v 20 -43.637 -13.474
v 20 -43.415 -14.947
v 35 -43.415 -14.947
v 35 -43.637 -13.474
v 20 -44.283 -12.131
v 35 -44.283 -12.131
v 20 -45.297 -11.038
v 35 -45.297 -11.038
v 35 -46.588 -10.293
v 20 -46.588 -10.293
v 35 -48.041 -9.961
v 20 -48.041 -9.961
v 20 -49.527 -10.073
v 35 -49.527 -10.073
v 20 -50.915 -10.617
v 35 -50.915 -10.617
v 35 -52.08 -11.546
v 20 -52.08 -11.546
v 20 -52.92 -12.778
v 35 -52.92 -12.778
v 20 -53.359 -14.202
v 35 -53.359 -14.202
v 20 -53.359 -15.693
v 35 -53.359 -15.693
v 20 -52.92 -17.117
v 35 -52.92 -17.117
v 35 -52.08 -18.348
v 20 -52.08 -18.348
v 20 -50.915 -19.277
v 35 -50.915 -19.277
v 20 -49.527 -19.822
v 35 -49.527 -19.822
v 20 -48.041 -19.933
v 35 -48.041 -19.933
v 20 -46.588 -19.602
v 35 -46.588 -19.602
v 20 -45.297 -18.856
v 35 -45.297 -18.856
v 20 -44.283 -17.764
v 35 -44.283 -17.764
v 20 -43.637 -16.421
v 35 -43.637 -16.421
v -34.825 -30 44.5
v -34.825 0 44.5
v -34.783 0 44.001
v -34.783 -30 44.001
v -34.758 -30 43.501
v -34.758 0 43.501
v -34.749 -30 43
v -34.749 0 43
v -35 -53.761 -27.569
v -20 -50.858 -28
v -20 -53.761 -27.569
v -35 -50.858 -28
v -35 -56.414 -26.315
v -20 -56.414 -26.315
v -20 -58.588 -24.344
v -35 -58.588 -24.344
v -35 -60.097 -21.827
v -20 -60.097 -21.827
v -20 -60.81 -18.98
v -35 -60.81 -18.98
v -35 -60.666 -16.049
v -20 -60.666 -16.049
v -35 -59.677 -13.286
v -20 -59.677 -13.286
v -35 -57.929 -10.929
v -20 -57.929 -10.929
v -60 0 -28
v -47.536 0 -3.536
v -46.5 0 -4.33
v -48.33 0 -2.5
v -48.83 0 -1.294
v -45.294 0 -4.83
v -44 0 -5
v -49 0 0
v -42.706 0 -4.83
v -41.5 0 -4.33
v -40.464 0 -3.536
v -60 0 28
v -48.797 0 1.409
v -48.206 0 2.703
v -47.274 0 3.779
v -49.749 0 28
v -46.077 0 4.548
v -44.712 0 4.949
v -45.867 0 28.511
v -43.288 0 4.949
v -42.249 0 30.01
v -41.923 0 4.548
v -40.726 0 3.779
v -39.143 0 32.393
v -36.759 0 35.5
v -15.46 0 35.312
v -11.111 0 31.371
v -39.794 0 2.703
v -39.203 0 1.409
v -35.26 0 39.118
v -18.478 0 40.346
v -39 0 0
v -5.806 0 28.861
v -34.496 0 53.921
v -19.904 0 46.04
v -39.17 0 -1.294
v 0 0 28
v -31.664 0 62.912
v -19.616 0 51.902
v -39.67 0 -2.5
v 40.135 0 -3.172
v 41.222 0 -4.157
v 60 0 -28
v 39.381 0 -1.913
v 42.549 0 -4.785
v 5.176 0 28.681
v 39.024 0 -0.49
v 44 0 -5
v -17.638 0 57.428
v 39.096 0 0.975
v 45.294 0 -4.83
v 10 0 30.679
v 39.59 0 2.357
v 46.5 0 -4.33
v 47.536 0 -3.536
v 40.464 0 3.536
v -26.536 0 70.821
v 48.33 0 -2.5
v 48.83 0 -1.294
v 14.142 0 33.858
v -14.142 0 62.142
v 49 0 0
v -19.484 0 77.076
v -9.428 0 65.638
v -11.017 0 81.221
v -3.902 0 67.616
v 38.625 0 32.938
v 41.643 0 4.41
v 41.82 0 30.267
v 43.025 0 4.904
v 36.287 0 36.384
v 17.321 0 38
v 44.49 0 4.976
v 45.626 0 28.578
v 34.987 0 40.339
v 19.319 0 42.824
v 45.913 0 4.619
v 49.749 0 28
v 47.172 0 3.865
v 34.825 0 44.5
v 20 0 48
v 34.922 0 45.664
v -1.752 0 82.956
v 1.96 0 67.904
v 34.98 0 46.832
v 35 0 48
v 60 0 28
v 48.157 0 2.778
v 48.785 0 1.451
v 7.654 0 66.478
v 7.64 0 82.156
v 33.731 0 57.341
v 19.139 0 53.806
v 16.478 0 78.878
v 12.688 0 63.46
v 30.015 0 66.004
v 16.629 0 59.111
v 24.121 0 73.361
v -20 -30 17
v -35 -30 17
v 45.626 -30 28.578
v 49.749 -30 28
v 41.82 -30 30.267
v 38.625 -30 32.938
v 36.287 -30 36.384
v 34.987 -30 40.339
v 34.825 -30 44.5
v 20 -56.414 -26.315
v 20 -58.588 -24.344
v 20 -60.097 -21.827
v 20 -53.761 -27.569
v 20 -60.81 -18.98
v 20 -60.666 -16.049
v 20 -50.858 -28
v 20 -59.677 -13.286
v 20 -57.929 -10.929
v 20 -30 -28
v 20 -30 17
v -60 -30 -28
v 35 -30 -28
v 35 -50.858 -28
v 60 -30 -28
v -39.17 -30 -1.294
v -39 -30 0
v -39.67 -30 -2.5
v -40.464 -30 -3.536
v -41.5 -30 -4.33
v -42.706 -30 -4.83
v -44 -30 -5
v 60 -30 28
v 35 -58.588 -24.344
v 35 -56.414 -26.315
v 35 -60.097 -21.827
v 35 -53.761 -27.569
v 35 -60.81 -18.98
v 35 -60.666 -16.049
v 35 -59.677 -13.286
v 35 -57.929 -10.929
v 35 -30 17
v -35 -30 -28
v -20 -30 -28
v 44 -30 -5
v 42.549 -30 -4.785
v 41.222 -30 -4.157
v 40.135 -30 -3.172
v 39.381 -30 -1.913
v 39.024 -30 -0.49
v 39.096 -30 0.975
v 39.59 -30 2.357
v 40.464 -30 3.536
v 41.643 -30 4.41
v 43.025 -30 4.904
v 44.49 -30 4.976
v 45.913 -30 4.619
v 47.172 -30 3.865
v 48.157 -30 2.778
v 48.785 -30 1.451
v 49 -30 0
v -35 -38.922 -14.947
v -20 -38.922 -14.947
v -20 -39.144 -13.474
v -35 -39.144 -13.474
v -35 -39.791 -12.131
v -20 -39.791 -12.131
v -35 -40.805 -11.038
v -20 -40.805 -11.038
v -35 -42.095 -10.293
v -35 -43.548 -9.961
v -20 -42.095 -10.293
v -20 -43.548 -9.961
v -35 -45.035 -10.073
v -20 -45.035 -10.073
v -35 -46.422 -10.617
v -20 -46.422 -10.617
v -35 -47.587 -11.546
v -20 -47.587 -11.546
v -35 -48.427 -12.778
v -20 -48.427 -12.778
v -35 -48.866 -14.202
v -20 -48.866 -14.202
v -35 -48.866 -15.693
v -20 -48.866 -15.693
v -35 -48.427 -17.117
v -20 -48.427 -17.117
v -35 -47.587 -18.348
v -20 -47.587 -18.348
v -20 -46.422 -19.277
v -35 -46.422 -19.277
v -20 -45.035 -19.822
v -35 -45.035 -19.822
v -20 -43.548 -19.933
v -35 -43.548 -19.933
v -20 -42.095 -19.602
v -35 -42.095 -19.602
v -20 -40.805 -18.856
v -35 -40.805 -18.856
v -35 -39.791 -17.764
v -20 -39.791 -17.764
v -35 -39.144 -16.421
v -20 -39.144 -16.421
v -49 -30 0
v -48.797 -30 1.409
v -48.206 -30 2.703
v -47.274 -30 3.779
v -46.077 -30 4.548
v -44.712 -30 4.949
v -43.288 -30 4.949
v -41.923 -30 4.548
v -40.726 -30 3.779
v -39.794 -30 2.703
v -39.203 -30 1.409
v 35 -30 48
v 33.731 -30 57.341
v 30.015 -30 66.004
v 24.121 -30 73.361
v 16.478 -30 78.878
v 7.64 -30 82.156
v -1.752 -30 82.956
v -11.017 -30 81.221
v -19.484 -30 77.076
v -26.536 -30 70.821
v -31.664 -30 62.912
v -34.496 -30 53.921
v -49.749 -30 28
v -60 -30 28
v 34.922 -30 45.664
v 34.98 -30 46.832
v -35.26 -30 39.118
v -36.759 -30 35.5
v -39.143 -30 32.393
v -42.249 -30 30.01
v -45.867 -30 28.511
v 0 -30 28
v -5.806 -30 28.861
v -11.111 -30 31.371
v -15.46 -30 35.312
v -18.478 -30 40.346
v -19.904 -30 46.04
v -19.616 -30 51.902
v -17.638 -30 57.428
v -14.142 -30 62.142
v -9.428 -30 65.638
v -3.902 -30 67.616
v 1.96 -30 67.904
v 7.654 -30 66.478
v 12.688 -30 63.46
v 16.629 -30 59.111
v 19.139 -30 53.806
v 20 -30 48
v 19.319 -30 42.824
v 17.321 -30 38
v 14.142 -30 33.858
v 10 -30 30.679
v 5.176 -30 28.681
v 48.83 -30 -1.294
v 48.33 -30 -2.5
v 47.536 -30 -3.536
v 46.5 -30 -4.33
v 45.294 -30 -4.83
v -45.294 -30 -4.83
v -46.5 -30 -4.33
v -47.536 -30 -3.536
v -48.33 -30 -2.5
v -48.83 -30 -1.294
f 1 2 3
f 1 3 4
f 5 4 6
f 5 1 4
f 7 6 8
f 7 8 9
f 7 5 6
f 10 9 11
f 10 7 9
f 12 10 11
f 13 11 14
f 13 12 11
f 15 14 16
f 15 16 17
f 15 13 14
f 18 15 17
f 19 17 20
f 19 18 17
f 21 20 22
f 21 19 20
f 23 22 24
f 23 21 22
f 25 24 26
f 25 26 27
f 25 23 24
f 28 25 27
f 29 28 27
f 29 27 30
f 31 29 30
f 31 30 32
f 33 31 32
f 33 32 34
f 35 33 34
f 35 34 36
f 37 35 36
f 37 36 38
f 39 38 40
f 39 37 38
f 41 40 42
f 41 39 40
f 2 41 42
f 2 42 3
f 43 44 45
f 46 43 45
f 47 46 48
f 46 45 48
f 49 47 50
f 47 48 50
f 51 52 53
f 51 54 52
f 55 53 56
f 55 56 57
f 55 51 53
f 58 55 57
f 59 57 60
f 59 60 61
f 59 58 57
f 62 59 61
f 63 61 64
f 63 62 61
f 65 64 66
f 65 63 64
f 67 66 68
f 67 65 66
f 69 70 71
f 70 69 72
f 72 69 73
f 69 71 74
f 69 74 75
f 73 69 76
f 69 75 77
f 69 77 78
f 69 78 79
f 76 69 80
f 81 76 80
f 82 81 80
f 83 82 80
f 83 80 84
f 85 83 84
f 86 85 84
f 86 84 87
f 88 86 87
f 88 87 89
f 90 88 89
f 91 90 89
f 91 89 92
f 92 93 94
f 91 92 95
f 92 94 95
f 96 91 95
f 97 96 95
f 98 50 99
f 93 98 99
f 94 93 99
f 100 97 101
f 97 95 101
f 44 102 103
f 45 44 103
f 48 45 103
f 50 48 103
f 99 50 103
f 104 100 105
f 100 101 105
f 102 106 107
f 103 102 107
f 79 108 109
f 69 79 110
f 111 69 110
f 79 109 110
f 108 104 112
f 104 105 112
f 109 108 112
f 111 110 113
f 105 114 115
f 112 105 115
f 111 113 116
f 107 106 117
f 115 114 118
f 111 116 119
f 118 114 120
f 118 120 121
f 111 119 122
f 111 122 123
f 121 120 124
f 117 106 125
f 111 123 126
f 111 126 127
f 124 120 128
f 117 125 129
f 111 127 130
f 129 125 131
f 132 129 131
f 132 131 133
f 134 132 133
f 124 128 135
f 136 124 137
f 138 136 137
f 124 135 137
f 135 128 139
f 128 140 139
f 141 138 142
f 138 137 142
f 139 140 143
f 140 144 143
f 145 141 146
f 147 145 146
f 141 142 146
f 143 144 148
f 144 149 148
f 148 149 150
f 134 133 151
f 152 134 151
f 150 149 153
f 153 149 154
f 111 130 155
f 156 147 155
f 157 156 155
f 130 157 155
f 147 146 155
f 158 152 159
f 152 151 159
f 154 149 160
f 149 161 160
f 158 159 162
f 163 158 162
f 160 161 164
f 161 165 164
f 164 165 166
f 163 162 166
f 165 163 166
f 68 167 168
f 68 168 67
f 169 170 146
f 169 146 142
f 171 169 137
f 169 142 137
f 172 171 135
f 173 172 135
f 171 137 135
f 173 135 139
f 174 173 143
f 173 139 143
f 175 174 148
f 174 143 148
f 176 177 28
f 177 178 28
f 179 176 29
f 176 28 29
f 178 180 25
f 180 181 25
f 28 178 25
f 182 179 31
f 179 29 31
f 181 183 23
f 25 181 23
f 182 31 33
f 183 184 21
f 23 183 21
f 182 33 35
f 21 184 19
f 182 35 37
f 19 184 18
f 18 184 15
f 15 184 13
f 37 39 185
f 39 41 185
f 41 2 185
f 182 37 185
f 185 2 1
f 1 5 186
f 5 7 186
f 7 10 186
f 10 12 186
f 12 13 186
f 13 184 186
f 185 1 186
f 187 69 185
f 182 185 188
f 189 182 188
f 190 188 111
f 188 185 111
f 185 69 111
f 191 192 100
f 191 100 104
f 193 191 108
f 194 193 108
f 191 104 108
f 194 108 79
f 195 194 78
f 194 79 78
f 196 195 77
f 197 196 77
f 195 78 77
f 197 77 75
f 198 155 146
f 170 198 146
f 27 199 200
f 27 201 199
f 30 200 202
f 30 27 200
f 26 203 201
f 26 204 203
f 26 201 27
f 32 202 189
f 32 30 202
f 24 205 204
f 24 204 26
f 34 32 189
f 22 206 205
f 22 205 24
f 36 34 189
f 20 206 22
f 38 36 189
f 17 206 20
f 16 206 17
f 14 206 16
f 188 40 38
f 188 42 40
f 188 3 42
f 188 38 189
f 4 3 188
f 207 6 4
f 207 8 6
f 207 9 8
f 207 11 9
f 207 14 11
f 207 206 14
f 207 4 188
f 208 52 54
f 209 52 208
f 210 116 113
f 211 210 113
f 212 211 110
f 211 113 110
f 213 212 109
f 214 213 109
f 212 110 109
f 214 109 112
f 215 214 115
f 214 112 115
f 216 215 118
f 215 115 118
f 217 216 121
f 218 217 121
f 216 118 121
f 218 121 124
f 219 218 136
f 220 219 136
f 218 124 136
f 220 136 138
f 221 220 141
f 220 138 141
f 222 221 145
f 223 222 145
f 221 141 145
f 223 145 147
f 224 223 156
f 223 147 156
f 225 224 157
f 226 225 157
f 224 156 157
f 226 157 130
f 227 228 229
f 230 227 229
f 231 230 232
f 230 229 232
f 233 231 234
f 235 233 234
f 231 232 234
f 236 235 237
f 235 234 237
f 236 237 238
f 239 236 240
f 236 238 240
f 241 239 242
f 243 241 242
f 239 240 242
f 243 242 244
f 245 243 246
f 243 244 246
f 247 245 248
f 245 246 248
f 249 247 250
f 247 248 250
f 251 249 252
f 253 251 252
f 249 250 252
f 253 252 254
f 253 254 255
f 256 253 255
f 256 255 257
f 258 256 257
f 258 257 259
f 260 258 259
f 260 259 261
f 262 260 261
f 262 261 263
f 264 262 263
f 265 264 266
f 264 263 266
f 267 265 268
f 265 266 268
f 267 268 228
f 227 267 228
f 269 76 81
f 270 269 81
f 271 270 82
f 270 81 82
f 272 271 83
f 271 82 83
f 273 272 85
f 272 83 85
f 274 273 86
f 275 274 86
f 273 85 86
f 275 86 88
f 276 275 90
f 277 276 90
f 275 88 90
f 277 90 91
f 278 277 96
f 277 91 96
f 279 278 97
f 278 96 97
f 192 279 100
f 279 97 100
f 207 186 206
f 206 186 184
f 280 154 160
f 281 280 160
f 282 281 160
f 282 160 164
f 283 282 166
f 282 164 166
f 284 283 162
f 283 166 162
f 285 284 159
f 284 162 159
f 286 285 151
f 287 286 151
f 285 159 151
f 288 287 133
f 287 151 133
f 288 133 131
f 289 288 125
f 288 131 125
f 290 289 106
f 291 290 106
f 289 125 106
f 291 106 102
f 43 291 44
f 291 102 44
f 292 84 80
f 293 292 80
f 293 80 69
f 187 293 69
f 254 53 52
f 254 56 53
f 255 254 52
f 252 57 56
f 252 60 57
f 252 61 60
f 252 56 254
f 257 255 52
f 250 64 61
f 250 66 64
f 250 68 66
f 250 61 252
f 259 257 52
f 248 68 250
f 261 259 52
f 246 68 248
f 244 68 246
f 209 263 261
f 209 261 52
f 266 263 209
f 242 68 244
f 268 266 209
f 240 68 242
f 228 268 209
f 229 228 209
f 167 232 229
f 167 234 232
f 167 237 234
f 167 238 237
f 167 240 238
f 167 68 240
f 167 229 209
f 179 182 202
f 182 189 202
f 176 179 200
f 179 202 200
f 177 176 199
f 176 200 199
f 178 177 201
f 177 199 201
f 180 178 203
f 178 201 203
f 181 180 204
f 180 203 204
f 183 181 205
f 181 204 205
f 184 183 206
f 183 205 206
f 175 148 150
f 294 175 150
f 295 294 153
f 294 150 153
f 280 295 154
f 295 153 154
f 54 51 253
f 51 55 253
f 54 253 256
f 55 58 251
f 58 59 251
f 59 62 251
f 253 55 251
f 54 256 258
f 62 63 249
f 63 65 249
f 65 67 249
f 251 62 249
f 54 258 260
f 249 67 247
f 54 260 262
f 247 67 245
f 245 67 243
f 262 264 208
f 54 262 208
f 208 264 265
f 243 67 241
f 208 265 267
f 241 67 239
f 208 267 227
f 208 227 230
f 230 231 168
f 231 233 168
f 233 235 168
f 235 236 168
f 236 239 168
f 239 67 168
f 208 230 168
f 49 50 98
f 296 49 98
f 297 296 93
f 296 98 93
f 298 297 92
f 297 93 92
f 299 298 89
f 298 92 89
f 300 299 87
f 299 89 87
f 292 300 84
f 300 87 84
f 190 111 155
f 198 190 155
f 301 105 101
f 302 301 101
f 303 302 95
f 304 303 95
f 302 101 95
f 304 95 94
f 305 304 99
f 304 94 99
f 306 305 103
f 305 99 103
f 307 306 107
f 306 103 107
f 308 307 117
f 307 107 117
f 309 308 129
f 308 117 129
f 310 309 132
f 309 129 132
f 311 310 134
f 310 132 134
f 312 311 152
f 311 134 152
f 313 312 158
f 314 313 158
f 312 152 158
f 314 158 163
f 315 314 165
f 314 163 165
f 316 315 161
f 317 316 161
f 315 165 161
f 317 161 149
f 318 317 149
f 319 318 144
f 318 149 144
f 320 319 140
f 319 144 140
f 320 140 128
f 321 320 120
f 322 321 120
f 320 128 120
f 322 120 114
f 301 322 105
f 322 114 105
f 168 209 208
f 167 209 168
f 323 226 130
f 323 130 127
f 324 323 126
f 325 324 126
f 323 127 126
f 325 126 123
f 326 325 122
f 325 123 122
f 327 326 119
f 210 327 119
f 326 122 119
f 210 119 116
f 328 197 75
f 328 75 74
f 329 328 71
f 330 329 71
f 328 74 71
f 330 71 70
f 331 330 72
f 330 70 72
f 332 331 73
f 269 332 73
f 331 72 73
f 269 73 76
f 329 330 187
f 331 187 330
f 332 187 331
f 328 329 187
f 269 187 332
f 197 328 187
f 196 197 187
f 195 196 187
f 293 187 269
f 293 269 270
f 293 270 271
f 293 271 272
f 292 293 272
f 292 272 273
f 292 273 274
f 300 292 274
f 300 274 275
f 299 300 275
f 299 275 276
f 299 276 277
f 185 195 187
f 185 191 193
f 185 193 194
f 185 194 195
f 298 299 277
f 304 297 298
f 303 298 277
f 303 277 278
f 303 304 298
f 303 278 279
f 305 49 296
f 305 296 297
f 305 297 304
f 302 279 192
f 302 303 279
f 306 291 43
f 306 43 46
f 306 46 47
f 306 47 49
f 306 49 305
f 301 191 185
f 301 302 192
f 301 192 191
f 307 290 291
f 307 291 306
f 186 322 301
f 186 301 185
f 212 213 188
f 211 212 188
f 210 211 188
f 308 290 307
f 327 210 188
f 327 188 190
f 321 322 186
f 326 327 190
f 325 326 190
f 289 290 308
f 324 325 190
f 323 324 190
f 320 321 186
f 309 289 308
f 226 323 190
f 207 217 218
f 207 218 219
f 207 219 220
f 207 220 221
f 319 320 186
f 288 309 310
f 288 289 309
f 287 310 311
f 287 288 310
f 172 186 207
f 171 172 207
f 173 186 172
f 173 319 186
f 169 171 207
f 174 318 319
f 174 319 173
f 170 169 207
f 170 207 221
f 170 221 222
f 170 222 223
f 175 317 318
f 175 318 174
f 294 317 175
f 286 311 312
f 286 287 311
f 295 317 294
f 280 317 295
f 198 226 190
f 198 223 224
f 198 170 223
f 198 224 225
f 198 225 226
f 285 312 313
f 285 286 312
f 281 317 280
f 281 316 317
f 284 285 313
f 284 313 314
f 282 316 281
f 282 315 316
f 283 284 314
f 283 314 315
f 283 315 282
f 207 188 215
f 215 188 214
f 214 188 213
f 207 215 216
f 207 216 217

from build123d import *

# Parameters (mm, degrees)
F1_DEPTH = 30
F3_R     = 5
F4_DEPTH = 15
F5_R     = 10
F7_R     = 5
F8_DEPTH = 15
F9_R     = 10


# Not quite as in the source:
# - a feature names something its author has since deleted; it is built from what else it names


with BuildPart() as f1:
    # F0 (on Front) → F1 (new body)
    with BuildSketch(Plane.XZ):
        with BuildLine():
            Line((60, 0), (60, 28))
            Line((60, 28), (49.7493718553, 28))
            Line((49.7493718553, 28), (28.7228132327, 28))
            ThreePointArc((28.7228132327, 28), (0, 13), (-28.7228132327, 28))
            Line((-28.7228132327, 28), (-49.7493718553, 28))
            Line((-49.7493718553, 28), (-60, 28))
            Line((-60, 28), (-60, 0))
            Line((-60, 0), (-49, 0))
            ThreePointArc((-49, 0), (-44, 5), (-39, 0))
            ThreePointArc((-39, 0), (-40.4644660941, -3.5355339059), (-44, -5))
            Line((-44, -5), (-44, -28))
            Line((-44, -28), (44, -28))
            Line((44, -28), (44, -5))
            ThreePointArc((44, -5), (40.4644660941, 3.5355339059), (49, 0))
            Line((49, 0), (60, 0))
        make_face()
        with BuildLine():
            Line((-6.45e-08, 28), (28.7228132327, 28))
            ThreePointArc((28.7228132327, 28), (32.8272702395, 35.8603818585), (34.8245603048, 44.5000000607))
            ThreePointArc((34.8245603048, 44.5000000607), (34.9561125604, 46.2478029033), (35, 48))
            ThreePointArc((35, 48), (-1.7521970967, 82.9561125604), (-34.8245603048, 44.5000000607))
            ThreePointArc((-34.8245603048, 44.5000000607), (-32.8272702395, 35.8603818585), (-28.7228132327, 28))
            Line((-28.7228132327, 28), (-6.45e-08, 28))
        make_face()
        with BuildLine():
            ThreePointArc((20, 48), (14.1421356009, 33.8578643535), (-6.45e-08, 28))
            ThreePointArc((-6.45e-08, 28), (-14.1421356009, 62.1421356465), (20, 48))
        make_face(mode=Mode.SUBTRACT)
        with BuildLine():
            ThreePointArc((-28.7228132327, 28), (0, 13), (28.7228132327, 28))
            Line((28.7228132327, 28), (-6.45e-08, 28))
            Line((-6.45e-08, 28), (-28.7228132327, 28))
        make_face()
        with BuildLine():
            Line((-49.7493718553, 28), (-28.7228132327, 28))
            ThreePointArc((-28.7228132327, 28), (-32.8272702395, 35.8603818585), (-34.8245603048, 44.5000000607))
            ThreePointArc((-34.8245603048, 44.5000000607), (-34.7681807602, 43.7509416563), (-34.7493718553, 43))
            ThreePointArc((-34.7493718553, 43), (-39.1427701375, 32.3933982822), (-49.7493718553, 28))
        make_face()
        with BuildLine():
            Line((28.7228132327, 28), (49.7493718553, 28))
            ThreePointArc((49.7493718553, 28), (38.6250741042, 32.9376941239), (34.8245603048, 44.5000000607))
            ThreePointArc((34.8245603048, 44.5000000607), (32.8272702395, 35.8603818585), (28.7228132327, 28))
        make_face()
        with BuildLine():
            Line((-60, -28), (-44, -28))
            Line((-44, -28), (-44, -5))
            ThreePointArc((-44, -5), (-47.5355339059, -3.5355339059), (-49, 0))
            Line((-49, 0), (-60, 0))
            Line((-60, 0), (-60, -28))
        make_face()
        with BuildLine():
            Line((60, -28), (60, 0))
            Line((60, 0), (49, 0))
            ThreePointArc((49, 0), (47.5355339059, -3.5355339059), (44, -5))
            Line((44, -5), (44, -28))
            Line((44, -28), (60, -28))
        make_face()
    extrude(amount=F1_DEPTH)

    # F3 (on offset) → F4 (join)
    with BuildSketch(Plane.YZ.offset(20)):
        Polygon((-75, -28), (-30, -28), (-30, 17), align=None)
        with Locations((-48.4146624804, -14.9473380297)):
            Circle(F3_R, mode=Mode.SUBTRACT)
    extrude(amount=F4_DEPTH)

    # F5
    f5_edges = [f1.edges().sort_by_distance(p)[0] for p in [
        (27.5, -75, -28),
    ]]
    fillet(f5_edges, radius=F5_R)


with BuildPart() as f8:
    # F7 (on offset) → F8 (new body)
    with BuildSketch(Plane.YZ.offset(-20)):
        Polygon((-75, -28), (-30, -28), (-30, 17), align=None)
        with Locations((-43.9220774009, -14.9473380297)):
            Circle(F7_R, mode=Mode.SUBTRACT)
    extrude(amount=-F8_DEPTH)

    # F9
    f9_edges = [f8.edges().sort_by_distance(p)[0] for p in [
        (-27.5, -75, -28),
    ]]
    fillet(f9_edges, radius=F9_R)


solid = Compound([f1.part, f8.part])
